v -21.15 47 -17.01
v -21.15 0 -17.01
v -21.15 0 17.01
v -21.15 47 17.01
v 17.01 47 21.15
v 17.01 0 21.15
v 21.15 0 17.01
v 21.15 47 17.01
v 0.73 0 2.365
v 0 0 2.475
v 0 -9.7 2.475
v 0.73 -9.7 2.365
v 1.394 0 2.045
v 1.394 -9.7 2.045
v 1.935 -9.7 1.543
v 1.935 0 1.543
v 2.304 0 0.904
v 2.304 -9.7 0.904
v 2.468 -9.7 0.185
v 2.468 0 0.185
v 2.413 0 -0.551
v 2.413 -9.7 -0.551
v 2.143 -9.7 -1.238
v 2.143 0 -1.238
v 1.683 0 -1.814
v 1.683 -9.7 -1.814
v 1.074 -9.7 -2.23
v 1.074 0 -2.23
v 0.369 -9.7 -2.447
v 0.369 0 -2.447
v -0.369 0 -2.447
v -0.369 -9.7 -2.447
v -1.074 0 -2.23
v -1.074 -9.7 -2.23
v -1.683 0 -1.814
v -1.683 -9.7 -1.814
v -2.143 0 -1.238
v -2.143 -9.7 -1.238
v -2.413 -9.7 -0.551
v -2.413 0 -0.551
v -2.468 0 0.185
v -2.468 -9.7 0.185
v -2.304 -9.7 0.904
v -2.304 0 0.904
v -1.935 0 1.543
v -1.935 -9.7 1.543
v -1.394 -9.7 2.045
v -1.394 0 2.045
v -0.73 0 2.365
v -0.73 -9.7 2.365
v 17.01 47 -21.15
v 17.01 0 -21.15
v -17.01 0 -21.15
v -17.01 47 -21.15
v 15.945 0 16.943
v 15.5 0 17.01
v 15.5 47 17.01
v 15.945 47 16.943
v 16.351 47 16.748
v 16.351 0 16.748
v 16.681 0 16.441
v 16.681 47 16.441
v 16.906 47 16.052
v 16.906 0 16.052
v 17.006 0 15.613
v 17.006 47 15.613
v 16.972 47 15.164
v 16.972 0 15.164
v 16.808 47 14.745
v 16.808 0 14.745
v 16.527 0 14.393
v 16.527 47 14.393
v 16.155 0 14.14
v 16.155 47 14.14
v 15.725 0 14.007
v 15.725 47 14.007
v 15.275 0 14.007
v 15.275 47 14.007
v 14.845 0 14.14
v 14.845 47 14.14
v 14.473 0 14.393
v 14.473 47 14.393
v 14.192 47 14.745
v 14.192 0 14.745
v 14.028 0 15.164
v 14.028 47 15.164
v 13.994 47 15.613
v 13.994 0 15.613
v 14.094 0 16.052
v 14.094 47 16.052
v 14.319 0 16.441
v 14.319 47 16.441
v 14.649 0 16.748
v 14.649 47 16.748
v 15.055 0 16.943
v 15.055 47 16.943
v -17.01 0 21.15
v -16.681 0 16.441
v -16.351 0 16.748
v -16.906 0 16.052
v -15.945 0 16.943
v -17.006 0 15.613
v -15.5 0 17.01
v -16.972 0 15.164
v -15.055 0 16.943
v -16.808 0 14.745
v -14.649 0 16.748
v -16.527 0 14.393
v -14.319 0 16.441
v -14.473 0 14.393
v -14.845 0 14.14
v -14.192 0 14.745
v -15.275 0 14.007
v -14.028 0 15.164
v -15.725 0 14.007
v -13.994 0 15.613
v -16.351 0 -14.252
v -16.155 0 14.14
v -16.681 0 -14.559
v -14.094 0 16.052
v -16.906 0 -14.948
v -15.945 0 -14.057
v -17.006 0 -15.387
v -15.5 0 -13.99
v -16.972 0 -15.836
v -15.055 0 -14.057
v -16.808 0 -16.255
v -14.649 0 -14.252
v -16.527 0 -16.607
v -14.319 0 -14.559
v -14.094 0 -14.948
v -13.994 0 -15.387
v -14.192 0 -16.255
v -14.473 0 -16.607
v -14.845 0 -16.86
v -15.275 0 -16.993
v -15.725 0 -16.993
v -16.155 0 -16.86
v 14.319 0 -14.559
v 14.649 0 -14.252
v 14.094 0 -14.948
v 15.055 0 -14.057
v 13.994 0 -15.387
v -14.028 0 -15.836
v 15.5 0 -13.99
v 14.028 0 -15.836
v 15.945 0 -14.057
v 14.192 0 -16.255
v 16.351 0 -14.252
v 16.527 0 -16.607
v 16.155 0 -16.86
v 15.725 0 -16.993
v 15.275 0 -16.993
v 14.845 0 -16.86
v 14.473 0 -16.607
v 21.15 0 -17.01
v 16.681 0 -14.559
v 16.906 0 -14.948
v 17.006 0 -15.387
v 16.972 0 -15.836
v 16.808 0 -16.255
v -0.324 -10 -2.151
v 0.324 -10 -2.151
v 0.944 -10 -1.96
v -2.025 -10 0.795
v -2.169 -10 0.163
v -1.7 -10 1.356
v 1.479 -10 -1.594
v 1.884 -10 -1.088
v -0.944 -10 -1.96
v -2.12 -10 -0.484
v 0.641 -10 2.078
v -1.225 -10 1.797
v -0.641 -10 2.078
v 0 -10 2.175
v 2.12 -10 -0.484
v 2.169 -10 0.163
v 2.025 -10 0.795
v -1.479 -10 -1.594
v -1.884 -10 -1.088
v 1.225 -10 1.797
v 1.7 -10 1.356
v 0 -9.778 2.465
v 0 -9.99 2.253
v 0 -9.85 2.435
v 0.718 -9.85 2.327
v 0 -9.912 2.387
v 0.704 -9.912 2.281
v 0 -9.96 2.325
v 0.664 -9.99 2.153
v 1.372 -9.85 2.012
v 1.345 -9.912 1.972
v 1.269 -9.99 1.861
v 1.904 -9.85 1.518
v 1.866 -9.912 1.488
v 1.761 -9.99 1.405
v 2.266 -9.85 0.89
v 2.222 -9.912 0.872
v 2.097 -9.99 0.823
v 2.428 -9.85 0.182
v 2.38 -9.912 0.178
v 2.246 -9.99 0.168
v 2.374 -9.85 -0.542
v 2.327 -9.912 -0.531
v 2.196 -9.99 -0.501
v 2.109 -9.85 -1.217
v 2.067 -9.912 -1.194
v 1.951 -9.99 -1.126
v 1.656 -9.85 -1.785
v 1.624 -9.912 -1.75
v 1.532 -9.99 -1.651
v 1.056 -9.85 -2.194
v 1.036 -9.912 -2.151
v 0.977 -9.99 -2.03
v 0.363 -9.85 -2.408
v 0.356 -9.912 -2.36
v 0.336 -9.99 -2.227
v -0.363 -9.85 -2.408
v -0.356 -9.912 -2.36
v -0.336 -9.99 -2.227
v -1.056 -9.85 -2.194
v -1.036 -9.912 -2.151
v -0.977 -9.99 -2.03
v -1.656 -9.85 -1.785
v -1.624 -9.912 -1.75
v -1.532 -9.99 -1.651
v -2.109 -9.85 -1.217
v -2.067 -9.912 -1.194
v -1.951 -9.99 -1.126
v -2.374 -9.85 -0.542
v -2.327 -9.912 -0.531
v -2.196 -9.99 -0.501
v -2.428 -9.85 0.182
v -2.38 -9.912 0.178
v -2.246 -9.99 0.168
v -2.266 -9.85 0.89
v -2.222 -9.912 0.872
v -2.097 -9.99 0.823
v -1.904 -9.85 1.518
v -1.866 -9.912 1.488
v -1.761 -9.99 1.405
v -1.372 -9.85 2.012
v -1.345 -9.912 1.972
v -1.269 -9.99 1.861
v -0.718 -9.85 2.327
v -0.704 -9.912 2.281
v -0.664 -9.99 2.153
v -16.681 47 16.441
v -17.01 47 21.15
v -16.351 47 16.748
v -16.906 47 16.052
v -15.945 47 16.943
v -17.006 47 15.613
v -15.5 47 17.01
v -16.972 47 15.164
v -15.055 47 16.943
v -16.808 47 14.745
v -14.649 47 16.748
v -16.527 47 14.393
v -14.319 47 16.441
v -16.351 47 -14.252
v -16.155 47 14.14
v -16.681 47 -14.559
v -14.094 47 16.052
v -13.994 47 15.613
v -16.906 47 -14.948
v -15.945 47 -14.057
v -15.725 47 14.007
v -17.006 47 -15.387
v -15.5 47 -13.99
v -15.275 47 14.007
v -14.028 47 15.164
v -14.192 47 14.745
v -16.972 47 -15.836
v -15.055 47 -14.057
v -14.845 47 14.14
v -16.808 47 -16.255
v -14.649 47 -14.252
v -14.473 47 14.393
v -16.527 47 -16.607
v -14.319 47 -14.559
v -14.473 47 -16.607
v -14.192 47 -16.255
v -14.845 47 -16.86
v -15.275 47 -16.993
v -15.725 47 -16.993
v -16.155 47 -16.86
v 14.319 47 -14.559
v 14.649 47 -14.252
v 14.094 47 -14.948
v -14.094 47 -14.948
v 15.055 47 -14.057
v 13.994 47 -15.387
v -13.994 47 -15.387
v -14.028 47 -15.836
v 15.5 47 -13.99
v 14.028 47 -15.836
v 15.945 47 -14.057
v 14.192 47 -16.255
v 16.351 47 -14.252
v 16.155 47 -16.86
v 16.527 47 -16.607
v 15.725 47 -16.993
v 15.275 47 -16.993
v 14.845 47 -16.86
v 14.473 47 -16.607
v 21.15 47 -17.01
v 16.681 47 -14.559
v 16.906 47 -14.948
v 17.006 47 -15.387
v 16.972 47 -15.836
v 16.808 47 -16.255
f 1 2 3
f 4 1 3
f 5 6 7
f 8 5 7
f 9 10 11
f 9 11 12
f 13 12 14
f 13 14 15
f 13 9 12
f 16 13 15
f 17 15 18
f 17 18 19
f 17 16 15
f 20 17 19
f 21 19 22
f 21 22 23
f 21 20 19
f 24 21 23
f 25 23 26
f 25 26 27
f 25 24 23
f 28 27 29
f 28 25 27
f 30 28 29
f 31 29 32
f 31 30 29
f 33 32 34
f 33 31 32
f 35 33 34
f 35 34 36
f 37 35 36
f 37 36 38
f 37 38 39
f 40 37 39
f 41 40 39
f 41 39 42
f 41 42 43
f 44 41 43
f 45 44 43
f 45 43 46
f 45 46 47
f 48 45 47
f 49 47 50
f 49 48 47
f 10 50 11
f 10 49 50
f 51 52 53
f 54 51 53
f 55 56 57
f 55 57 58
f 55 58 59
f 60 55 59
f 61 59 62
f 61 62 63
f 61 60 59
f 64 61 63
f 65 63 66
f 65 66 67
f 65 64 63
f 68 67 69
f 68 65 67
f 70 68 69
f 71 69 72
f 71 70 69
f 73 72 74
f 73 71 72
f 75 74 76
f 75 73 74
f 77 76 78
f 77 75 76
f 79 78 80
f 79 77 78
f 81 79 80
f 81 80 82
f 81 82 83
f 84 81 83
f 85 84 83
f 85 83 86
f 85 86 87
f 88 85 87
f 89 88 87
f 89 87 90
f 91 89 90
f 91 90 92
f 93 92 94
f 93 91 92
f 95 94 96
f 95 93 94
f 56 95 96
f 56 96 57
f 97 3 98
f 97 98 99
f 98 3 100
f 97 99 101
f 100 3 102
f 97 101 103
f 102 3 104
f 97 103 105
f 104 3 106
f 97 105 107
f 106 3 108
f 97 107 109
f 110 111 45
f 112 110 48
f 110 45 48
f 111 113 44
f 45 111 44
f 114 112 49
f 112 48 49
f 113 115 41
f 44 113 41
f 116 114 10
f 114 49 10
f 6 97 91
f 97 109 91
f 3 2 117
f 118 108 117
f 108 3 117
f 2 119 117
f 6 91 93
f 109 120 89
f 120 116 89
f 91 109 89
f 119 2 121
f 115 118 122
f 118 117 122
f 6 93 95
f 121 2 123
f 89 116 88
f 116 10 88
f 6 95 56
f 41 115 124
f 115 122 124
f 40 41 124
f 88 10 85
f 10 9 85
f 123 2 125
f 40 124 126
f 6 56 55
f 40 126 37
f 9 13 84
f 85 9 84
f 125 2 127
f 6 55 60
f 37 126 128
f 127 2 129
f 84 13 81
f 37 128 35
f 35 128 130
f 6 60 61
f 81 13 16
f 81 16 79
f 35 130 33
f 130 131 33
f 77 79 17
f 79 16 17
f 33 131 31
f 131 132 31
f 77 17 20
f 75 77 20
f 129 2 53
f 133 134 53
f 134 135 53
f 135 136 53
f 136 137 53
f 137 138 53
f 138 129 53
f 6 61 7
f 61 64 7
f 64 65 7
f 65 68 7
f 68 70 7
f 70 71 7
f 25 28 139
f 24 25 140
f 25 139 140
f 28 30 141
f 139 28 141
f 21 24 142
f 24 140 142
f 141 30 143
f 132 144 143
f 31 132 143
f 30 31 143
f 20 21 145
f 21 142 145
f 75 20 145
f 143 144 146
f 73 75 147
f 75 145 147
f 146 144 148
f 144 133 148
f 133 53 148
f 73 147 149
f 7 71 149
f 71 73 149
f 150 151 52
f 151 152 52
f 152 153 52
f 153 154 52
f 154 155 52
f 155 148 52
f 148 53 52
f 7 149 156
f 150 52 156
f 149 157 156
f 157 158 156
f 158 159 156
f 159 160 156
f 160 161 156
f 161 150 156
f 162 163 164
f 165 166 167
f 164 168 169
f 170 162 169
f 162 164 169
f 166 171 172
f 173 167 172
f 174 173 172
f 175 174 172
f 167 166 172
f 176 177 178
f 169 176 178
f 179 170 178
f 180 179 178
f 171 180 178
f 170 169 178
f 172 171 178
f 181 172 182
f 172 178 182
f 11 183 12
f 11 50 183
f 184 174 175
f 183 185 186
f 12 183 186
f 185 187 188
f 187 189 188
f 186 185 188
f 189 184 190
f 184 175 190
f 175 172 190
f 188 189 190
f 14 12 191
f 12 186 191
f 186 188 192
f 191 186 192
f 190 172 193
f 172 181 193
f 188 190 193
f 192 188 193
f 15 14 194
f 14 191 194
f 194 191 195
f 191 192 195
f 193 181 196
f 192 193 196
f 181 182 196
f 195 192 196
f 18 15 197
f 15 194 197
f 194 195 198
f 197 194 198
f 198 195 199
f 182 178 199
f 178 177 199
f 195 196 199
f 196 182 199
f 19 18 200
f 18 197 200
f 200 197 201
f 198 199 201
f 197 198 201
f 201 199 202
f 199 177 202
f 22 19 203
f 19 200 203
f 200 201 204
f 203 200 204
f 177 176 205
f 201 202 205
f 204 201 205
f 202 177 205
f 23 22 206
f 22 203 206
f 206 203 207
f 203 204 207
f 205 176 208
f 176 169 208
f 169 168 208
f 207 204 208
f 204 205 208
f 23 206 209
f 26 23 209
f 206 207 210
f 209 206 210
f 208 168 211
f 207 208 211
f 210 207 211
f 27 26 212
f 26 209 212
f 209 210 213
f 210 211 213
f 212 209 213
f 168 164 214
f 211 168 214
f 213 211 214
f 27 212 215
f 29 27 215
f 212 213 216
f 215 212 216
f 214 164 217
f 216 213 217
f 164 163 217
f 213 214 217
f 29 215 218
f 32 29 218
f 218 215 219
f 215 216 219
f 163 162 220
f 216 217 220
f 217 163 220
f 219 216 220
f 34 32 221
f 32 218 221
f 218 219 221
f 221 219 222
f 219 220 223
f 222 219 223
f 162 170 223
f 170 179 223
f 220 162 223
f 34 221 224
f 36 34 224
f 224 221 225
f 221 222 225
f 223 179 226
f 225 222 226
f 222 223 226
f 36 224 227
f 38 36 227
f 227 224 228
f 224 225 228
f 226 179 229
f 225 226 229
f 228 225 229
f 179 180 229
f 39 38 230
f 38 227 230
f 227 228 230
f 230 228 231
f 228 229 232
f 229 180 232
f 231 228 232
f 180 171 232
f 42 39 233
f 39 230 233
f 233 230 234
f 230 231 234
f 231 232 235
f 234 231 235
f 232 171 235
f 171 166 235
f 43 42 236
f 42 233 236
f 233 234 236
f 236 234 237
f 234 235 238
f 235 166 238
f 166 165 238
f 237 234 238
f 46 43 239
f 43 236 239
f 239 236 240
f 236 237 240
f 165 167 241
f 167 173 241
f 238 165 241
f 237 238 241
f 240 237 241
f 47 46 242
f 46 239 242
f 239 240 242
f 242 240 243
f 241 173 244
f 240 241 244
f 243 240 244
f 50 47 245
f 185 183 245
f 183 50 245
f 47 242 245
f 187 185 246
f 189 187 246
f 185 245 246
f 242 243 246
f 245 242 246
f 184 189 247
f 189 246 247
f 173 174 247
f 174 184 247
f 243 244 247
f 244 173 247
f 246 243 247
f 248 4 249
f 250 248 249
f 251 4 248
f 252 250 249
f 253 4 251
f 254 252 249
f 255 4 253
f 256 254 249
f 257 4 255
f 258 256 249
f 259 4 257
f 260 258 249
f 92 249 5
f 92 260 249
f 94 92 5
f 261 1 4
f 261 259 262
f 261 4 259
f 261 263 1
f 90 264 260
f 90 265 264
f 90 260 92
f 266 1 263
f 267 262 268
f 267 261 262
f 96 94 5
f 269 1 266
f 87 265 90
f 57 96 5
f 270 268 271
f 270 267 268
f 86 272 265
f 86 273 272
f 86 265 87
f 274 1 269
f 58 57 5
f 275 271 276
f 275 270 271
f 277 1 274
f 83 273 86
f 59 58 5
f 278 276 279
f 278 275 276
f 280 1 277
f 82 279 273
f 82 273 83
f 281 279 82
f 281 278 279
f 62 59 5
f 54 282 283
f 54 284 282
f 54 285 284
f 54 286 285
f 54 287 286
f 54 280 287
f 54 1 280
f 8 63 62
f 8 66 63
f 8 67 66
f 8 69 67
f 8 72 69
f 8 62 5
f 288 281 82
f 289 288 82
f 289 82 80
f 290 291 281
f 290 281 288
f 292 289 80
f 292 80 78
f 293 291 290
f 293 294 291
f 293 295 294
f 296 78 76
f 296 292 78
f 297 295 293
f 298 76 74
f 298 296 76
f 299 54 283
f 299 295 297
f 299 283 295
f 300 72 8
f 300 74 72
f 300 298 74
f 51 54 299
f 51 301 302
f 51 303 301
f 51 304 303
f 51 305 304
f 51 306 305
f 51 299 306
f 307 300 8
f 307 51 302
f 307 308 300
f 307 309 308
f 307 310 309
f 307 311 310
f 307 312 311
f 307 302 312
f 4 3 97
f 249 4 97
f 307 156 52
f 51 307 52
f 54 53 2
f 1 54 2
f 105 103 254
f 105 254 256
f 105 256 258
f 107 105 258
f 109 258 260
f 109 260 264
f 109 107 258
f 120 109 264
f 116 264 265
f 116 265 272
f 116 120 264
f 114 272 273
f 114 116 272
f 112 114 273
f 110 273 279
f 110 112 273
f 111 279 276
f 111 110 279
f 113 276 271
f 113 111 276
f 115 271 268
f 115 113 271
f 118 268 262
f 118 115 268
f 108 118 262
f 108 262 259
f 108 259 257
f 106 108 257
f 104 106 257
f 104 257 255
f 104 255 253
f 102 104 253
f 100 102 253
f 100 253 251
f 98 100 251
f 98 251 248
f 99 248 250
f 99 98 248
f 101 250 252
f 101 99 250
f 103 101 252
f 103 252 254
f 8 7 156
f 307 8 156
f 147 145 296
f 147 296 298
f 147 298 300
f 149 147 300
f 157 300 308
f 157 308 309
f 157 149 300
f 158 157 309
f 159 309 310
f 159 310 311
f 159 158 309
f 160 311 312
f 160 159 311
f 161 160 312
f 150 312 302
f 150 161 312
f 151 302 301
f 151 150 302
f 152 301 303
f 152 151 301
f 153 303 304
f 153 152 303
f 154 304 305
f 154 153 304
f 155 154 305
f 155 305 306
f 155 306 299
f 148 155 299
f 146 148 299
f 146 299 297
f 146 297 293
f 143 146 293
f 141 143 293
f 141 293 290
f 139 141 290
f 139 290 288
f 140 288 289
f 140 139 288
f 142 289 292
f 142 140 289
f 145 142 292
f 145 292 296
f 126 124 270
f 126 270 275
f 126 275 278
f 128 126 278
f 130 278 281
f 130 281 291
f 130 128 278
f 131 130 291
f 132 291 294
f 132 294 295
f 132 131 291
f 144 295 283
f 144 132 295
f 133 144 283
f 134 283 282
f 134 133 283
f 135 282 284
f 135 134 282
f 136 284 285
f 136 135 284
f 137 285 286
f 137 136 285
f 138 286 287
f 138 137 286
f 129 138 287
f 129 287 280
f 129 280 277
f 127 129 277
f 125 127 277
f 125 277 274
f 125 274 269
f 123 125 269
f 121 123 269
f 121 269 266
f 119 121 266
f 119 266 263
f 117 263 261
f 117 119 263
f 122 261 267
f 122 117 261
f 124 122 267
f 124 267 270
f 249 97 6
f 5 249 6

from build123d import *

# Parameters (mm, degrees)
SKETCH1_R           = 1.51
BOSS_EXTRUDE1_DEPTH = 47
SKETCH4_R           = 2.475
BOSS_EXTRUDE2_DEPTH = 10
FILLET1_R           = 0.3


with BuildPart() as part:
    # Sketch1 → Boss-Extrude1 (new body)
    with BuildSketch(Plane(origin=(0, 0, 0), x_dir=(1, 0, 0), z_dir=(0, 1, 0))):
        Polygon((-17.01, 21.15), (-21.15, 17.01), (-21.15, -17.01), (-17.01, -21.15), (17.01, -21.15), (21.15, -17.01), (21.15, 17.01), (17.01, 21.15), align=None)
        with Locations(Location((15.5, 15.5, 0), (0, 0, 270))):
            Circle(SKETCH1_R, mode=Mode.SUBTRACT)
        with Locations(Location((15.5, -15.5, 0), (0, 0, 270))):
            Circle(SKETCH1_R, mode=Mode.SUBTRACT)
        with Locations(Location((-15.5, -15.5, 0), (0, 0, 270))):
            Circle(SKETCH1_R, mode=Mode.SUBTRACT)
        with Locations(Location((-15.5, 15.5, 0), (0, 0, 270))):
            Circle(SKETCH1_R, mode=Mode.SUBTRACT)
    extrude(amount=BOSS_EXTRUDE1_DEPTH)

    # Sketch4 → Boss-Extrude2 (add)
    with BuildSketch(Plane(origin=(0, 0, 0), x_dir=(1, 0, 0), z_dir=(0, 1, 0))):
        with Locations(Location((0, 0, 0), (0, 0, 270))):
            Circle(SKETCH4_R)
    extrude(amount=-BOSS_EXTRUDE2_DEPTH)

    # Fillet1
    fillet1_edges = [part.edges().sort_by_distance(p)[0] for p in [
        (0, -10, -2.475),
    ]]
    fillet(fillet1_edges, radius=FILLET1_R)


solid = part.part
